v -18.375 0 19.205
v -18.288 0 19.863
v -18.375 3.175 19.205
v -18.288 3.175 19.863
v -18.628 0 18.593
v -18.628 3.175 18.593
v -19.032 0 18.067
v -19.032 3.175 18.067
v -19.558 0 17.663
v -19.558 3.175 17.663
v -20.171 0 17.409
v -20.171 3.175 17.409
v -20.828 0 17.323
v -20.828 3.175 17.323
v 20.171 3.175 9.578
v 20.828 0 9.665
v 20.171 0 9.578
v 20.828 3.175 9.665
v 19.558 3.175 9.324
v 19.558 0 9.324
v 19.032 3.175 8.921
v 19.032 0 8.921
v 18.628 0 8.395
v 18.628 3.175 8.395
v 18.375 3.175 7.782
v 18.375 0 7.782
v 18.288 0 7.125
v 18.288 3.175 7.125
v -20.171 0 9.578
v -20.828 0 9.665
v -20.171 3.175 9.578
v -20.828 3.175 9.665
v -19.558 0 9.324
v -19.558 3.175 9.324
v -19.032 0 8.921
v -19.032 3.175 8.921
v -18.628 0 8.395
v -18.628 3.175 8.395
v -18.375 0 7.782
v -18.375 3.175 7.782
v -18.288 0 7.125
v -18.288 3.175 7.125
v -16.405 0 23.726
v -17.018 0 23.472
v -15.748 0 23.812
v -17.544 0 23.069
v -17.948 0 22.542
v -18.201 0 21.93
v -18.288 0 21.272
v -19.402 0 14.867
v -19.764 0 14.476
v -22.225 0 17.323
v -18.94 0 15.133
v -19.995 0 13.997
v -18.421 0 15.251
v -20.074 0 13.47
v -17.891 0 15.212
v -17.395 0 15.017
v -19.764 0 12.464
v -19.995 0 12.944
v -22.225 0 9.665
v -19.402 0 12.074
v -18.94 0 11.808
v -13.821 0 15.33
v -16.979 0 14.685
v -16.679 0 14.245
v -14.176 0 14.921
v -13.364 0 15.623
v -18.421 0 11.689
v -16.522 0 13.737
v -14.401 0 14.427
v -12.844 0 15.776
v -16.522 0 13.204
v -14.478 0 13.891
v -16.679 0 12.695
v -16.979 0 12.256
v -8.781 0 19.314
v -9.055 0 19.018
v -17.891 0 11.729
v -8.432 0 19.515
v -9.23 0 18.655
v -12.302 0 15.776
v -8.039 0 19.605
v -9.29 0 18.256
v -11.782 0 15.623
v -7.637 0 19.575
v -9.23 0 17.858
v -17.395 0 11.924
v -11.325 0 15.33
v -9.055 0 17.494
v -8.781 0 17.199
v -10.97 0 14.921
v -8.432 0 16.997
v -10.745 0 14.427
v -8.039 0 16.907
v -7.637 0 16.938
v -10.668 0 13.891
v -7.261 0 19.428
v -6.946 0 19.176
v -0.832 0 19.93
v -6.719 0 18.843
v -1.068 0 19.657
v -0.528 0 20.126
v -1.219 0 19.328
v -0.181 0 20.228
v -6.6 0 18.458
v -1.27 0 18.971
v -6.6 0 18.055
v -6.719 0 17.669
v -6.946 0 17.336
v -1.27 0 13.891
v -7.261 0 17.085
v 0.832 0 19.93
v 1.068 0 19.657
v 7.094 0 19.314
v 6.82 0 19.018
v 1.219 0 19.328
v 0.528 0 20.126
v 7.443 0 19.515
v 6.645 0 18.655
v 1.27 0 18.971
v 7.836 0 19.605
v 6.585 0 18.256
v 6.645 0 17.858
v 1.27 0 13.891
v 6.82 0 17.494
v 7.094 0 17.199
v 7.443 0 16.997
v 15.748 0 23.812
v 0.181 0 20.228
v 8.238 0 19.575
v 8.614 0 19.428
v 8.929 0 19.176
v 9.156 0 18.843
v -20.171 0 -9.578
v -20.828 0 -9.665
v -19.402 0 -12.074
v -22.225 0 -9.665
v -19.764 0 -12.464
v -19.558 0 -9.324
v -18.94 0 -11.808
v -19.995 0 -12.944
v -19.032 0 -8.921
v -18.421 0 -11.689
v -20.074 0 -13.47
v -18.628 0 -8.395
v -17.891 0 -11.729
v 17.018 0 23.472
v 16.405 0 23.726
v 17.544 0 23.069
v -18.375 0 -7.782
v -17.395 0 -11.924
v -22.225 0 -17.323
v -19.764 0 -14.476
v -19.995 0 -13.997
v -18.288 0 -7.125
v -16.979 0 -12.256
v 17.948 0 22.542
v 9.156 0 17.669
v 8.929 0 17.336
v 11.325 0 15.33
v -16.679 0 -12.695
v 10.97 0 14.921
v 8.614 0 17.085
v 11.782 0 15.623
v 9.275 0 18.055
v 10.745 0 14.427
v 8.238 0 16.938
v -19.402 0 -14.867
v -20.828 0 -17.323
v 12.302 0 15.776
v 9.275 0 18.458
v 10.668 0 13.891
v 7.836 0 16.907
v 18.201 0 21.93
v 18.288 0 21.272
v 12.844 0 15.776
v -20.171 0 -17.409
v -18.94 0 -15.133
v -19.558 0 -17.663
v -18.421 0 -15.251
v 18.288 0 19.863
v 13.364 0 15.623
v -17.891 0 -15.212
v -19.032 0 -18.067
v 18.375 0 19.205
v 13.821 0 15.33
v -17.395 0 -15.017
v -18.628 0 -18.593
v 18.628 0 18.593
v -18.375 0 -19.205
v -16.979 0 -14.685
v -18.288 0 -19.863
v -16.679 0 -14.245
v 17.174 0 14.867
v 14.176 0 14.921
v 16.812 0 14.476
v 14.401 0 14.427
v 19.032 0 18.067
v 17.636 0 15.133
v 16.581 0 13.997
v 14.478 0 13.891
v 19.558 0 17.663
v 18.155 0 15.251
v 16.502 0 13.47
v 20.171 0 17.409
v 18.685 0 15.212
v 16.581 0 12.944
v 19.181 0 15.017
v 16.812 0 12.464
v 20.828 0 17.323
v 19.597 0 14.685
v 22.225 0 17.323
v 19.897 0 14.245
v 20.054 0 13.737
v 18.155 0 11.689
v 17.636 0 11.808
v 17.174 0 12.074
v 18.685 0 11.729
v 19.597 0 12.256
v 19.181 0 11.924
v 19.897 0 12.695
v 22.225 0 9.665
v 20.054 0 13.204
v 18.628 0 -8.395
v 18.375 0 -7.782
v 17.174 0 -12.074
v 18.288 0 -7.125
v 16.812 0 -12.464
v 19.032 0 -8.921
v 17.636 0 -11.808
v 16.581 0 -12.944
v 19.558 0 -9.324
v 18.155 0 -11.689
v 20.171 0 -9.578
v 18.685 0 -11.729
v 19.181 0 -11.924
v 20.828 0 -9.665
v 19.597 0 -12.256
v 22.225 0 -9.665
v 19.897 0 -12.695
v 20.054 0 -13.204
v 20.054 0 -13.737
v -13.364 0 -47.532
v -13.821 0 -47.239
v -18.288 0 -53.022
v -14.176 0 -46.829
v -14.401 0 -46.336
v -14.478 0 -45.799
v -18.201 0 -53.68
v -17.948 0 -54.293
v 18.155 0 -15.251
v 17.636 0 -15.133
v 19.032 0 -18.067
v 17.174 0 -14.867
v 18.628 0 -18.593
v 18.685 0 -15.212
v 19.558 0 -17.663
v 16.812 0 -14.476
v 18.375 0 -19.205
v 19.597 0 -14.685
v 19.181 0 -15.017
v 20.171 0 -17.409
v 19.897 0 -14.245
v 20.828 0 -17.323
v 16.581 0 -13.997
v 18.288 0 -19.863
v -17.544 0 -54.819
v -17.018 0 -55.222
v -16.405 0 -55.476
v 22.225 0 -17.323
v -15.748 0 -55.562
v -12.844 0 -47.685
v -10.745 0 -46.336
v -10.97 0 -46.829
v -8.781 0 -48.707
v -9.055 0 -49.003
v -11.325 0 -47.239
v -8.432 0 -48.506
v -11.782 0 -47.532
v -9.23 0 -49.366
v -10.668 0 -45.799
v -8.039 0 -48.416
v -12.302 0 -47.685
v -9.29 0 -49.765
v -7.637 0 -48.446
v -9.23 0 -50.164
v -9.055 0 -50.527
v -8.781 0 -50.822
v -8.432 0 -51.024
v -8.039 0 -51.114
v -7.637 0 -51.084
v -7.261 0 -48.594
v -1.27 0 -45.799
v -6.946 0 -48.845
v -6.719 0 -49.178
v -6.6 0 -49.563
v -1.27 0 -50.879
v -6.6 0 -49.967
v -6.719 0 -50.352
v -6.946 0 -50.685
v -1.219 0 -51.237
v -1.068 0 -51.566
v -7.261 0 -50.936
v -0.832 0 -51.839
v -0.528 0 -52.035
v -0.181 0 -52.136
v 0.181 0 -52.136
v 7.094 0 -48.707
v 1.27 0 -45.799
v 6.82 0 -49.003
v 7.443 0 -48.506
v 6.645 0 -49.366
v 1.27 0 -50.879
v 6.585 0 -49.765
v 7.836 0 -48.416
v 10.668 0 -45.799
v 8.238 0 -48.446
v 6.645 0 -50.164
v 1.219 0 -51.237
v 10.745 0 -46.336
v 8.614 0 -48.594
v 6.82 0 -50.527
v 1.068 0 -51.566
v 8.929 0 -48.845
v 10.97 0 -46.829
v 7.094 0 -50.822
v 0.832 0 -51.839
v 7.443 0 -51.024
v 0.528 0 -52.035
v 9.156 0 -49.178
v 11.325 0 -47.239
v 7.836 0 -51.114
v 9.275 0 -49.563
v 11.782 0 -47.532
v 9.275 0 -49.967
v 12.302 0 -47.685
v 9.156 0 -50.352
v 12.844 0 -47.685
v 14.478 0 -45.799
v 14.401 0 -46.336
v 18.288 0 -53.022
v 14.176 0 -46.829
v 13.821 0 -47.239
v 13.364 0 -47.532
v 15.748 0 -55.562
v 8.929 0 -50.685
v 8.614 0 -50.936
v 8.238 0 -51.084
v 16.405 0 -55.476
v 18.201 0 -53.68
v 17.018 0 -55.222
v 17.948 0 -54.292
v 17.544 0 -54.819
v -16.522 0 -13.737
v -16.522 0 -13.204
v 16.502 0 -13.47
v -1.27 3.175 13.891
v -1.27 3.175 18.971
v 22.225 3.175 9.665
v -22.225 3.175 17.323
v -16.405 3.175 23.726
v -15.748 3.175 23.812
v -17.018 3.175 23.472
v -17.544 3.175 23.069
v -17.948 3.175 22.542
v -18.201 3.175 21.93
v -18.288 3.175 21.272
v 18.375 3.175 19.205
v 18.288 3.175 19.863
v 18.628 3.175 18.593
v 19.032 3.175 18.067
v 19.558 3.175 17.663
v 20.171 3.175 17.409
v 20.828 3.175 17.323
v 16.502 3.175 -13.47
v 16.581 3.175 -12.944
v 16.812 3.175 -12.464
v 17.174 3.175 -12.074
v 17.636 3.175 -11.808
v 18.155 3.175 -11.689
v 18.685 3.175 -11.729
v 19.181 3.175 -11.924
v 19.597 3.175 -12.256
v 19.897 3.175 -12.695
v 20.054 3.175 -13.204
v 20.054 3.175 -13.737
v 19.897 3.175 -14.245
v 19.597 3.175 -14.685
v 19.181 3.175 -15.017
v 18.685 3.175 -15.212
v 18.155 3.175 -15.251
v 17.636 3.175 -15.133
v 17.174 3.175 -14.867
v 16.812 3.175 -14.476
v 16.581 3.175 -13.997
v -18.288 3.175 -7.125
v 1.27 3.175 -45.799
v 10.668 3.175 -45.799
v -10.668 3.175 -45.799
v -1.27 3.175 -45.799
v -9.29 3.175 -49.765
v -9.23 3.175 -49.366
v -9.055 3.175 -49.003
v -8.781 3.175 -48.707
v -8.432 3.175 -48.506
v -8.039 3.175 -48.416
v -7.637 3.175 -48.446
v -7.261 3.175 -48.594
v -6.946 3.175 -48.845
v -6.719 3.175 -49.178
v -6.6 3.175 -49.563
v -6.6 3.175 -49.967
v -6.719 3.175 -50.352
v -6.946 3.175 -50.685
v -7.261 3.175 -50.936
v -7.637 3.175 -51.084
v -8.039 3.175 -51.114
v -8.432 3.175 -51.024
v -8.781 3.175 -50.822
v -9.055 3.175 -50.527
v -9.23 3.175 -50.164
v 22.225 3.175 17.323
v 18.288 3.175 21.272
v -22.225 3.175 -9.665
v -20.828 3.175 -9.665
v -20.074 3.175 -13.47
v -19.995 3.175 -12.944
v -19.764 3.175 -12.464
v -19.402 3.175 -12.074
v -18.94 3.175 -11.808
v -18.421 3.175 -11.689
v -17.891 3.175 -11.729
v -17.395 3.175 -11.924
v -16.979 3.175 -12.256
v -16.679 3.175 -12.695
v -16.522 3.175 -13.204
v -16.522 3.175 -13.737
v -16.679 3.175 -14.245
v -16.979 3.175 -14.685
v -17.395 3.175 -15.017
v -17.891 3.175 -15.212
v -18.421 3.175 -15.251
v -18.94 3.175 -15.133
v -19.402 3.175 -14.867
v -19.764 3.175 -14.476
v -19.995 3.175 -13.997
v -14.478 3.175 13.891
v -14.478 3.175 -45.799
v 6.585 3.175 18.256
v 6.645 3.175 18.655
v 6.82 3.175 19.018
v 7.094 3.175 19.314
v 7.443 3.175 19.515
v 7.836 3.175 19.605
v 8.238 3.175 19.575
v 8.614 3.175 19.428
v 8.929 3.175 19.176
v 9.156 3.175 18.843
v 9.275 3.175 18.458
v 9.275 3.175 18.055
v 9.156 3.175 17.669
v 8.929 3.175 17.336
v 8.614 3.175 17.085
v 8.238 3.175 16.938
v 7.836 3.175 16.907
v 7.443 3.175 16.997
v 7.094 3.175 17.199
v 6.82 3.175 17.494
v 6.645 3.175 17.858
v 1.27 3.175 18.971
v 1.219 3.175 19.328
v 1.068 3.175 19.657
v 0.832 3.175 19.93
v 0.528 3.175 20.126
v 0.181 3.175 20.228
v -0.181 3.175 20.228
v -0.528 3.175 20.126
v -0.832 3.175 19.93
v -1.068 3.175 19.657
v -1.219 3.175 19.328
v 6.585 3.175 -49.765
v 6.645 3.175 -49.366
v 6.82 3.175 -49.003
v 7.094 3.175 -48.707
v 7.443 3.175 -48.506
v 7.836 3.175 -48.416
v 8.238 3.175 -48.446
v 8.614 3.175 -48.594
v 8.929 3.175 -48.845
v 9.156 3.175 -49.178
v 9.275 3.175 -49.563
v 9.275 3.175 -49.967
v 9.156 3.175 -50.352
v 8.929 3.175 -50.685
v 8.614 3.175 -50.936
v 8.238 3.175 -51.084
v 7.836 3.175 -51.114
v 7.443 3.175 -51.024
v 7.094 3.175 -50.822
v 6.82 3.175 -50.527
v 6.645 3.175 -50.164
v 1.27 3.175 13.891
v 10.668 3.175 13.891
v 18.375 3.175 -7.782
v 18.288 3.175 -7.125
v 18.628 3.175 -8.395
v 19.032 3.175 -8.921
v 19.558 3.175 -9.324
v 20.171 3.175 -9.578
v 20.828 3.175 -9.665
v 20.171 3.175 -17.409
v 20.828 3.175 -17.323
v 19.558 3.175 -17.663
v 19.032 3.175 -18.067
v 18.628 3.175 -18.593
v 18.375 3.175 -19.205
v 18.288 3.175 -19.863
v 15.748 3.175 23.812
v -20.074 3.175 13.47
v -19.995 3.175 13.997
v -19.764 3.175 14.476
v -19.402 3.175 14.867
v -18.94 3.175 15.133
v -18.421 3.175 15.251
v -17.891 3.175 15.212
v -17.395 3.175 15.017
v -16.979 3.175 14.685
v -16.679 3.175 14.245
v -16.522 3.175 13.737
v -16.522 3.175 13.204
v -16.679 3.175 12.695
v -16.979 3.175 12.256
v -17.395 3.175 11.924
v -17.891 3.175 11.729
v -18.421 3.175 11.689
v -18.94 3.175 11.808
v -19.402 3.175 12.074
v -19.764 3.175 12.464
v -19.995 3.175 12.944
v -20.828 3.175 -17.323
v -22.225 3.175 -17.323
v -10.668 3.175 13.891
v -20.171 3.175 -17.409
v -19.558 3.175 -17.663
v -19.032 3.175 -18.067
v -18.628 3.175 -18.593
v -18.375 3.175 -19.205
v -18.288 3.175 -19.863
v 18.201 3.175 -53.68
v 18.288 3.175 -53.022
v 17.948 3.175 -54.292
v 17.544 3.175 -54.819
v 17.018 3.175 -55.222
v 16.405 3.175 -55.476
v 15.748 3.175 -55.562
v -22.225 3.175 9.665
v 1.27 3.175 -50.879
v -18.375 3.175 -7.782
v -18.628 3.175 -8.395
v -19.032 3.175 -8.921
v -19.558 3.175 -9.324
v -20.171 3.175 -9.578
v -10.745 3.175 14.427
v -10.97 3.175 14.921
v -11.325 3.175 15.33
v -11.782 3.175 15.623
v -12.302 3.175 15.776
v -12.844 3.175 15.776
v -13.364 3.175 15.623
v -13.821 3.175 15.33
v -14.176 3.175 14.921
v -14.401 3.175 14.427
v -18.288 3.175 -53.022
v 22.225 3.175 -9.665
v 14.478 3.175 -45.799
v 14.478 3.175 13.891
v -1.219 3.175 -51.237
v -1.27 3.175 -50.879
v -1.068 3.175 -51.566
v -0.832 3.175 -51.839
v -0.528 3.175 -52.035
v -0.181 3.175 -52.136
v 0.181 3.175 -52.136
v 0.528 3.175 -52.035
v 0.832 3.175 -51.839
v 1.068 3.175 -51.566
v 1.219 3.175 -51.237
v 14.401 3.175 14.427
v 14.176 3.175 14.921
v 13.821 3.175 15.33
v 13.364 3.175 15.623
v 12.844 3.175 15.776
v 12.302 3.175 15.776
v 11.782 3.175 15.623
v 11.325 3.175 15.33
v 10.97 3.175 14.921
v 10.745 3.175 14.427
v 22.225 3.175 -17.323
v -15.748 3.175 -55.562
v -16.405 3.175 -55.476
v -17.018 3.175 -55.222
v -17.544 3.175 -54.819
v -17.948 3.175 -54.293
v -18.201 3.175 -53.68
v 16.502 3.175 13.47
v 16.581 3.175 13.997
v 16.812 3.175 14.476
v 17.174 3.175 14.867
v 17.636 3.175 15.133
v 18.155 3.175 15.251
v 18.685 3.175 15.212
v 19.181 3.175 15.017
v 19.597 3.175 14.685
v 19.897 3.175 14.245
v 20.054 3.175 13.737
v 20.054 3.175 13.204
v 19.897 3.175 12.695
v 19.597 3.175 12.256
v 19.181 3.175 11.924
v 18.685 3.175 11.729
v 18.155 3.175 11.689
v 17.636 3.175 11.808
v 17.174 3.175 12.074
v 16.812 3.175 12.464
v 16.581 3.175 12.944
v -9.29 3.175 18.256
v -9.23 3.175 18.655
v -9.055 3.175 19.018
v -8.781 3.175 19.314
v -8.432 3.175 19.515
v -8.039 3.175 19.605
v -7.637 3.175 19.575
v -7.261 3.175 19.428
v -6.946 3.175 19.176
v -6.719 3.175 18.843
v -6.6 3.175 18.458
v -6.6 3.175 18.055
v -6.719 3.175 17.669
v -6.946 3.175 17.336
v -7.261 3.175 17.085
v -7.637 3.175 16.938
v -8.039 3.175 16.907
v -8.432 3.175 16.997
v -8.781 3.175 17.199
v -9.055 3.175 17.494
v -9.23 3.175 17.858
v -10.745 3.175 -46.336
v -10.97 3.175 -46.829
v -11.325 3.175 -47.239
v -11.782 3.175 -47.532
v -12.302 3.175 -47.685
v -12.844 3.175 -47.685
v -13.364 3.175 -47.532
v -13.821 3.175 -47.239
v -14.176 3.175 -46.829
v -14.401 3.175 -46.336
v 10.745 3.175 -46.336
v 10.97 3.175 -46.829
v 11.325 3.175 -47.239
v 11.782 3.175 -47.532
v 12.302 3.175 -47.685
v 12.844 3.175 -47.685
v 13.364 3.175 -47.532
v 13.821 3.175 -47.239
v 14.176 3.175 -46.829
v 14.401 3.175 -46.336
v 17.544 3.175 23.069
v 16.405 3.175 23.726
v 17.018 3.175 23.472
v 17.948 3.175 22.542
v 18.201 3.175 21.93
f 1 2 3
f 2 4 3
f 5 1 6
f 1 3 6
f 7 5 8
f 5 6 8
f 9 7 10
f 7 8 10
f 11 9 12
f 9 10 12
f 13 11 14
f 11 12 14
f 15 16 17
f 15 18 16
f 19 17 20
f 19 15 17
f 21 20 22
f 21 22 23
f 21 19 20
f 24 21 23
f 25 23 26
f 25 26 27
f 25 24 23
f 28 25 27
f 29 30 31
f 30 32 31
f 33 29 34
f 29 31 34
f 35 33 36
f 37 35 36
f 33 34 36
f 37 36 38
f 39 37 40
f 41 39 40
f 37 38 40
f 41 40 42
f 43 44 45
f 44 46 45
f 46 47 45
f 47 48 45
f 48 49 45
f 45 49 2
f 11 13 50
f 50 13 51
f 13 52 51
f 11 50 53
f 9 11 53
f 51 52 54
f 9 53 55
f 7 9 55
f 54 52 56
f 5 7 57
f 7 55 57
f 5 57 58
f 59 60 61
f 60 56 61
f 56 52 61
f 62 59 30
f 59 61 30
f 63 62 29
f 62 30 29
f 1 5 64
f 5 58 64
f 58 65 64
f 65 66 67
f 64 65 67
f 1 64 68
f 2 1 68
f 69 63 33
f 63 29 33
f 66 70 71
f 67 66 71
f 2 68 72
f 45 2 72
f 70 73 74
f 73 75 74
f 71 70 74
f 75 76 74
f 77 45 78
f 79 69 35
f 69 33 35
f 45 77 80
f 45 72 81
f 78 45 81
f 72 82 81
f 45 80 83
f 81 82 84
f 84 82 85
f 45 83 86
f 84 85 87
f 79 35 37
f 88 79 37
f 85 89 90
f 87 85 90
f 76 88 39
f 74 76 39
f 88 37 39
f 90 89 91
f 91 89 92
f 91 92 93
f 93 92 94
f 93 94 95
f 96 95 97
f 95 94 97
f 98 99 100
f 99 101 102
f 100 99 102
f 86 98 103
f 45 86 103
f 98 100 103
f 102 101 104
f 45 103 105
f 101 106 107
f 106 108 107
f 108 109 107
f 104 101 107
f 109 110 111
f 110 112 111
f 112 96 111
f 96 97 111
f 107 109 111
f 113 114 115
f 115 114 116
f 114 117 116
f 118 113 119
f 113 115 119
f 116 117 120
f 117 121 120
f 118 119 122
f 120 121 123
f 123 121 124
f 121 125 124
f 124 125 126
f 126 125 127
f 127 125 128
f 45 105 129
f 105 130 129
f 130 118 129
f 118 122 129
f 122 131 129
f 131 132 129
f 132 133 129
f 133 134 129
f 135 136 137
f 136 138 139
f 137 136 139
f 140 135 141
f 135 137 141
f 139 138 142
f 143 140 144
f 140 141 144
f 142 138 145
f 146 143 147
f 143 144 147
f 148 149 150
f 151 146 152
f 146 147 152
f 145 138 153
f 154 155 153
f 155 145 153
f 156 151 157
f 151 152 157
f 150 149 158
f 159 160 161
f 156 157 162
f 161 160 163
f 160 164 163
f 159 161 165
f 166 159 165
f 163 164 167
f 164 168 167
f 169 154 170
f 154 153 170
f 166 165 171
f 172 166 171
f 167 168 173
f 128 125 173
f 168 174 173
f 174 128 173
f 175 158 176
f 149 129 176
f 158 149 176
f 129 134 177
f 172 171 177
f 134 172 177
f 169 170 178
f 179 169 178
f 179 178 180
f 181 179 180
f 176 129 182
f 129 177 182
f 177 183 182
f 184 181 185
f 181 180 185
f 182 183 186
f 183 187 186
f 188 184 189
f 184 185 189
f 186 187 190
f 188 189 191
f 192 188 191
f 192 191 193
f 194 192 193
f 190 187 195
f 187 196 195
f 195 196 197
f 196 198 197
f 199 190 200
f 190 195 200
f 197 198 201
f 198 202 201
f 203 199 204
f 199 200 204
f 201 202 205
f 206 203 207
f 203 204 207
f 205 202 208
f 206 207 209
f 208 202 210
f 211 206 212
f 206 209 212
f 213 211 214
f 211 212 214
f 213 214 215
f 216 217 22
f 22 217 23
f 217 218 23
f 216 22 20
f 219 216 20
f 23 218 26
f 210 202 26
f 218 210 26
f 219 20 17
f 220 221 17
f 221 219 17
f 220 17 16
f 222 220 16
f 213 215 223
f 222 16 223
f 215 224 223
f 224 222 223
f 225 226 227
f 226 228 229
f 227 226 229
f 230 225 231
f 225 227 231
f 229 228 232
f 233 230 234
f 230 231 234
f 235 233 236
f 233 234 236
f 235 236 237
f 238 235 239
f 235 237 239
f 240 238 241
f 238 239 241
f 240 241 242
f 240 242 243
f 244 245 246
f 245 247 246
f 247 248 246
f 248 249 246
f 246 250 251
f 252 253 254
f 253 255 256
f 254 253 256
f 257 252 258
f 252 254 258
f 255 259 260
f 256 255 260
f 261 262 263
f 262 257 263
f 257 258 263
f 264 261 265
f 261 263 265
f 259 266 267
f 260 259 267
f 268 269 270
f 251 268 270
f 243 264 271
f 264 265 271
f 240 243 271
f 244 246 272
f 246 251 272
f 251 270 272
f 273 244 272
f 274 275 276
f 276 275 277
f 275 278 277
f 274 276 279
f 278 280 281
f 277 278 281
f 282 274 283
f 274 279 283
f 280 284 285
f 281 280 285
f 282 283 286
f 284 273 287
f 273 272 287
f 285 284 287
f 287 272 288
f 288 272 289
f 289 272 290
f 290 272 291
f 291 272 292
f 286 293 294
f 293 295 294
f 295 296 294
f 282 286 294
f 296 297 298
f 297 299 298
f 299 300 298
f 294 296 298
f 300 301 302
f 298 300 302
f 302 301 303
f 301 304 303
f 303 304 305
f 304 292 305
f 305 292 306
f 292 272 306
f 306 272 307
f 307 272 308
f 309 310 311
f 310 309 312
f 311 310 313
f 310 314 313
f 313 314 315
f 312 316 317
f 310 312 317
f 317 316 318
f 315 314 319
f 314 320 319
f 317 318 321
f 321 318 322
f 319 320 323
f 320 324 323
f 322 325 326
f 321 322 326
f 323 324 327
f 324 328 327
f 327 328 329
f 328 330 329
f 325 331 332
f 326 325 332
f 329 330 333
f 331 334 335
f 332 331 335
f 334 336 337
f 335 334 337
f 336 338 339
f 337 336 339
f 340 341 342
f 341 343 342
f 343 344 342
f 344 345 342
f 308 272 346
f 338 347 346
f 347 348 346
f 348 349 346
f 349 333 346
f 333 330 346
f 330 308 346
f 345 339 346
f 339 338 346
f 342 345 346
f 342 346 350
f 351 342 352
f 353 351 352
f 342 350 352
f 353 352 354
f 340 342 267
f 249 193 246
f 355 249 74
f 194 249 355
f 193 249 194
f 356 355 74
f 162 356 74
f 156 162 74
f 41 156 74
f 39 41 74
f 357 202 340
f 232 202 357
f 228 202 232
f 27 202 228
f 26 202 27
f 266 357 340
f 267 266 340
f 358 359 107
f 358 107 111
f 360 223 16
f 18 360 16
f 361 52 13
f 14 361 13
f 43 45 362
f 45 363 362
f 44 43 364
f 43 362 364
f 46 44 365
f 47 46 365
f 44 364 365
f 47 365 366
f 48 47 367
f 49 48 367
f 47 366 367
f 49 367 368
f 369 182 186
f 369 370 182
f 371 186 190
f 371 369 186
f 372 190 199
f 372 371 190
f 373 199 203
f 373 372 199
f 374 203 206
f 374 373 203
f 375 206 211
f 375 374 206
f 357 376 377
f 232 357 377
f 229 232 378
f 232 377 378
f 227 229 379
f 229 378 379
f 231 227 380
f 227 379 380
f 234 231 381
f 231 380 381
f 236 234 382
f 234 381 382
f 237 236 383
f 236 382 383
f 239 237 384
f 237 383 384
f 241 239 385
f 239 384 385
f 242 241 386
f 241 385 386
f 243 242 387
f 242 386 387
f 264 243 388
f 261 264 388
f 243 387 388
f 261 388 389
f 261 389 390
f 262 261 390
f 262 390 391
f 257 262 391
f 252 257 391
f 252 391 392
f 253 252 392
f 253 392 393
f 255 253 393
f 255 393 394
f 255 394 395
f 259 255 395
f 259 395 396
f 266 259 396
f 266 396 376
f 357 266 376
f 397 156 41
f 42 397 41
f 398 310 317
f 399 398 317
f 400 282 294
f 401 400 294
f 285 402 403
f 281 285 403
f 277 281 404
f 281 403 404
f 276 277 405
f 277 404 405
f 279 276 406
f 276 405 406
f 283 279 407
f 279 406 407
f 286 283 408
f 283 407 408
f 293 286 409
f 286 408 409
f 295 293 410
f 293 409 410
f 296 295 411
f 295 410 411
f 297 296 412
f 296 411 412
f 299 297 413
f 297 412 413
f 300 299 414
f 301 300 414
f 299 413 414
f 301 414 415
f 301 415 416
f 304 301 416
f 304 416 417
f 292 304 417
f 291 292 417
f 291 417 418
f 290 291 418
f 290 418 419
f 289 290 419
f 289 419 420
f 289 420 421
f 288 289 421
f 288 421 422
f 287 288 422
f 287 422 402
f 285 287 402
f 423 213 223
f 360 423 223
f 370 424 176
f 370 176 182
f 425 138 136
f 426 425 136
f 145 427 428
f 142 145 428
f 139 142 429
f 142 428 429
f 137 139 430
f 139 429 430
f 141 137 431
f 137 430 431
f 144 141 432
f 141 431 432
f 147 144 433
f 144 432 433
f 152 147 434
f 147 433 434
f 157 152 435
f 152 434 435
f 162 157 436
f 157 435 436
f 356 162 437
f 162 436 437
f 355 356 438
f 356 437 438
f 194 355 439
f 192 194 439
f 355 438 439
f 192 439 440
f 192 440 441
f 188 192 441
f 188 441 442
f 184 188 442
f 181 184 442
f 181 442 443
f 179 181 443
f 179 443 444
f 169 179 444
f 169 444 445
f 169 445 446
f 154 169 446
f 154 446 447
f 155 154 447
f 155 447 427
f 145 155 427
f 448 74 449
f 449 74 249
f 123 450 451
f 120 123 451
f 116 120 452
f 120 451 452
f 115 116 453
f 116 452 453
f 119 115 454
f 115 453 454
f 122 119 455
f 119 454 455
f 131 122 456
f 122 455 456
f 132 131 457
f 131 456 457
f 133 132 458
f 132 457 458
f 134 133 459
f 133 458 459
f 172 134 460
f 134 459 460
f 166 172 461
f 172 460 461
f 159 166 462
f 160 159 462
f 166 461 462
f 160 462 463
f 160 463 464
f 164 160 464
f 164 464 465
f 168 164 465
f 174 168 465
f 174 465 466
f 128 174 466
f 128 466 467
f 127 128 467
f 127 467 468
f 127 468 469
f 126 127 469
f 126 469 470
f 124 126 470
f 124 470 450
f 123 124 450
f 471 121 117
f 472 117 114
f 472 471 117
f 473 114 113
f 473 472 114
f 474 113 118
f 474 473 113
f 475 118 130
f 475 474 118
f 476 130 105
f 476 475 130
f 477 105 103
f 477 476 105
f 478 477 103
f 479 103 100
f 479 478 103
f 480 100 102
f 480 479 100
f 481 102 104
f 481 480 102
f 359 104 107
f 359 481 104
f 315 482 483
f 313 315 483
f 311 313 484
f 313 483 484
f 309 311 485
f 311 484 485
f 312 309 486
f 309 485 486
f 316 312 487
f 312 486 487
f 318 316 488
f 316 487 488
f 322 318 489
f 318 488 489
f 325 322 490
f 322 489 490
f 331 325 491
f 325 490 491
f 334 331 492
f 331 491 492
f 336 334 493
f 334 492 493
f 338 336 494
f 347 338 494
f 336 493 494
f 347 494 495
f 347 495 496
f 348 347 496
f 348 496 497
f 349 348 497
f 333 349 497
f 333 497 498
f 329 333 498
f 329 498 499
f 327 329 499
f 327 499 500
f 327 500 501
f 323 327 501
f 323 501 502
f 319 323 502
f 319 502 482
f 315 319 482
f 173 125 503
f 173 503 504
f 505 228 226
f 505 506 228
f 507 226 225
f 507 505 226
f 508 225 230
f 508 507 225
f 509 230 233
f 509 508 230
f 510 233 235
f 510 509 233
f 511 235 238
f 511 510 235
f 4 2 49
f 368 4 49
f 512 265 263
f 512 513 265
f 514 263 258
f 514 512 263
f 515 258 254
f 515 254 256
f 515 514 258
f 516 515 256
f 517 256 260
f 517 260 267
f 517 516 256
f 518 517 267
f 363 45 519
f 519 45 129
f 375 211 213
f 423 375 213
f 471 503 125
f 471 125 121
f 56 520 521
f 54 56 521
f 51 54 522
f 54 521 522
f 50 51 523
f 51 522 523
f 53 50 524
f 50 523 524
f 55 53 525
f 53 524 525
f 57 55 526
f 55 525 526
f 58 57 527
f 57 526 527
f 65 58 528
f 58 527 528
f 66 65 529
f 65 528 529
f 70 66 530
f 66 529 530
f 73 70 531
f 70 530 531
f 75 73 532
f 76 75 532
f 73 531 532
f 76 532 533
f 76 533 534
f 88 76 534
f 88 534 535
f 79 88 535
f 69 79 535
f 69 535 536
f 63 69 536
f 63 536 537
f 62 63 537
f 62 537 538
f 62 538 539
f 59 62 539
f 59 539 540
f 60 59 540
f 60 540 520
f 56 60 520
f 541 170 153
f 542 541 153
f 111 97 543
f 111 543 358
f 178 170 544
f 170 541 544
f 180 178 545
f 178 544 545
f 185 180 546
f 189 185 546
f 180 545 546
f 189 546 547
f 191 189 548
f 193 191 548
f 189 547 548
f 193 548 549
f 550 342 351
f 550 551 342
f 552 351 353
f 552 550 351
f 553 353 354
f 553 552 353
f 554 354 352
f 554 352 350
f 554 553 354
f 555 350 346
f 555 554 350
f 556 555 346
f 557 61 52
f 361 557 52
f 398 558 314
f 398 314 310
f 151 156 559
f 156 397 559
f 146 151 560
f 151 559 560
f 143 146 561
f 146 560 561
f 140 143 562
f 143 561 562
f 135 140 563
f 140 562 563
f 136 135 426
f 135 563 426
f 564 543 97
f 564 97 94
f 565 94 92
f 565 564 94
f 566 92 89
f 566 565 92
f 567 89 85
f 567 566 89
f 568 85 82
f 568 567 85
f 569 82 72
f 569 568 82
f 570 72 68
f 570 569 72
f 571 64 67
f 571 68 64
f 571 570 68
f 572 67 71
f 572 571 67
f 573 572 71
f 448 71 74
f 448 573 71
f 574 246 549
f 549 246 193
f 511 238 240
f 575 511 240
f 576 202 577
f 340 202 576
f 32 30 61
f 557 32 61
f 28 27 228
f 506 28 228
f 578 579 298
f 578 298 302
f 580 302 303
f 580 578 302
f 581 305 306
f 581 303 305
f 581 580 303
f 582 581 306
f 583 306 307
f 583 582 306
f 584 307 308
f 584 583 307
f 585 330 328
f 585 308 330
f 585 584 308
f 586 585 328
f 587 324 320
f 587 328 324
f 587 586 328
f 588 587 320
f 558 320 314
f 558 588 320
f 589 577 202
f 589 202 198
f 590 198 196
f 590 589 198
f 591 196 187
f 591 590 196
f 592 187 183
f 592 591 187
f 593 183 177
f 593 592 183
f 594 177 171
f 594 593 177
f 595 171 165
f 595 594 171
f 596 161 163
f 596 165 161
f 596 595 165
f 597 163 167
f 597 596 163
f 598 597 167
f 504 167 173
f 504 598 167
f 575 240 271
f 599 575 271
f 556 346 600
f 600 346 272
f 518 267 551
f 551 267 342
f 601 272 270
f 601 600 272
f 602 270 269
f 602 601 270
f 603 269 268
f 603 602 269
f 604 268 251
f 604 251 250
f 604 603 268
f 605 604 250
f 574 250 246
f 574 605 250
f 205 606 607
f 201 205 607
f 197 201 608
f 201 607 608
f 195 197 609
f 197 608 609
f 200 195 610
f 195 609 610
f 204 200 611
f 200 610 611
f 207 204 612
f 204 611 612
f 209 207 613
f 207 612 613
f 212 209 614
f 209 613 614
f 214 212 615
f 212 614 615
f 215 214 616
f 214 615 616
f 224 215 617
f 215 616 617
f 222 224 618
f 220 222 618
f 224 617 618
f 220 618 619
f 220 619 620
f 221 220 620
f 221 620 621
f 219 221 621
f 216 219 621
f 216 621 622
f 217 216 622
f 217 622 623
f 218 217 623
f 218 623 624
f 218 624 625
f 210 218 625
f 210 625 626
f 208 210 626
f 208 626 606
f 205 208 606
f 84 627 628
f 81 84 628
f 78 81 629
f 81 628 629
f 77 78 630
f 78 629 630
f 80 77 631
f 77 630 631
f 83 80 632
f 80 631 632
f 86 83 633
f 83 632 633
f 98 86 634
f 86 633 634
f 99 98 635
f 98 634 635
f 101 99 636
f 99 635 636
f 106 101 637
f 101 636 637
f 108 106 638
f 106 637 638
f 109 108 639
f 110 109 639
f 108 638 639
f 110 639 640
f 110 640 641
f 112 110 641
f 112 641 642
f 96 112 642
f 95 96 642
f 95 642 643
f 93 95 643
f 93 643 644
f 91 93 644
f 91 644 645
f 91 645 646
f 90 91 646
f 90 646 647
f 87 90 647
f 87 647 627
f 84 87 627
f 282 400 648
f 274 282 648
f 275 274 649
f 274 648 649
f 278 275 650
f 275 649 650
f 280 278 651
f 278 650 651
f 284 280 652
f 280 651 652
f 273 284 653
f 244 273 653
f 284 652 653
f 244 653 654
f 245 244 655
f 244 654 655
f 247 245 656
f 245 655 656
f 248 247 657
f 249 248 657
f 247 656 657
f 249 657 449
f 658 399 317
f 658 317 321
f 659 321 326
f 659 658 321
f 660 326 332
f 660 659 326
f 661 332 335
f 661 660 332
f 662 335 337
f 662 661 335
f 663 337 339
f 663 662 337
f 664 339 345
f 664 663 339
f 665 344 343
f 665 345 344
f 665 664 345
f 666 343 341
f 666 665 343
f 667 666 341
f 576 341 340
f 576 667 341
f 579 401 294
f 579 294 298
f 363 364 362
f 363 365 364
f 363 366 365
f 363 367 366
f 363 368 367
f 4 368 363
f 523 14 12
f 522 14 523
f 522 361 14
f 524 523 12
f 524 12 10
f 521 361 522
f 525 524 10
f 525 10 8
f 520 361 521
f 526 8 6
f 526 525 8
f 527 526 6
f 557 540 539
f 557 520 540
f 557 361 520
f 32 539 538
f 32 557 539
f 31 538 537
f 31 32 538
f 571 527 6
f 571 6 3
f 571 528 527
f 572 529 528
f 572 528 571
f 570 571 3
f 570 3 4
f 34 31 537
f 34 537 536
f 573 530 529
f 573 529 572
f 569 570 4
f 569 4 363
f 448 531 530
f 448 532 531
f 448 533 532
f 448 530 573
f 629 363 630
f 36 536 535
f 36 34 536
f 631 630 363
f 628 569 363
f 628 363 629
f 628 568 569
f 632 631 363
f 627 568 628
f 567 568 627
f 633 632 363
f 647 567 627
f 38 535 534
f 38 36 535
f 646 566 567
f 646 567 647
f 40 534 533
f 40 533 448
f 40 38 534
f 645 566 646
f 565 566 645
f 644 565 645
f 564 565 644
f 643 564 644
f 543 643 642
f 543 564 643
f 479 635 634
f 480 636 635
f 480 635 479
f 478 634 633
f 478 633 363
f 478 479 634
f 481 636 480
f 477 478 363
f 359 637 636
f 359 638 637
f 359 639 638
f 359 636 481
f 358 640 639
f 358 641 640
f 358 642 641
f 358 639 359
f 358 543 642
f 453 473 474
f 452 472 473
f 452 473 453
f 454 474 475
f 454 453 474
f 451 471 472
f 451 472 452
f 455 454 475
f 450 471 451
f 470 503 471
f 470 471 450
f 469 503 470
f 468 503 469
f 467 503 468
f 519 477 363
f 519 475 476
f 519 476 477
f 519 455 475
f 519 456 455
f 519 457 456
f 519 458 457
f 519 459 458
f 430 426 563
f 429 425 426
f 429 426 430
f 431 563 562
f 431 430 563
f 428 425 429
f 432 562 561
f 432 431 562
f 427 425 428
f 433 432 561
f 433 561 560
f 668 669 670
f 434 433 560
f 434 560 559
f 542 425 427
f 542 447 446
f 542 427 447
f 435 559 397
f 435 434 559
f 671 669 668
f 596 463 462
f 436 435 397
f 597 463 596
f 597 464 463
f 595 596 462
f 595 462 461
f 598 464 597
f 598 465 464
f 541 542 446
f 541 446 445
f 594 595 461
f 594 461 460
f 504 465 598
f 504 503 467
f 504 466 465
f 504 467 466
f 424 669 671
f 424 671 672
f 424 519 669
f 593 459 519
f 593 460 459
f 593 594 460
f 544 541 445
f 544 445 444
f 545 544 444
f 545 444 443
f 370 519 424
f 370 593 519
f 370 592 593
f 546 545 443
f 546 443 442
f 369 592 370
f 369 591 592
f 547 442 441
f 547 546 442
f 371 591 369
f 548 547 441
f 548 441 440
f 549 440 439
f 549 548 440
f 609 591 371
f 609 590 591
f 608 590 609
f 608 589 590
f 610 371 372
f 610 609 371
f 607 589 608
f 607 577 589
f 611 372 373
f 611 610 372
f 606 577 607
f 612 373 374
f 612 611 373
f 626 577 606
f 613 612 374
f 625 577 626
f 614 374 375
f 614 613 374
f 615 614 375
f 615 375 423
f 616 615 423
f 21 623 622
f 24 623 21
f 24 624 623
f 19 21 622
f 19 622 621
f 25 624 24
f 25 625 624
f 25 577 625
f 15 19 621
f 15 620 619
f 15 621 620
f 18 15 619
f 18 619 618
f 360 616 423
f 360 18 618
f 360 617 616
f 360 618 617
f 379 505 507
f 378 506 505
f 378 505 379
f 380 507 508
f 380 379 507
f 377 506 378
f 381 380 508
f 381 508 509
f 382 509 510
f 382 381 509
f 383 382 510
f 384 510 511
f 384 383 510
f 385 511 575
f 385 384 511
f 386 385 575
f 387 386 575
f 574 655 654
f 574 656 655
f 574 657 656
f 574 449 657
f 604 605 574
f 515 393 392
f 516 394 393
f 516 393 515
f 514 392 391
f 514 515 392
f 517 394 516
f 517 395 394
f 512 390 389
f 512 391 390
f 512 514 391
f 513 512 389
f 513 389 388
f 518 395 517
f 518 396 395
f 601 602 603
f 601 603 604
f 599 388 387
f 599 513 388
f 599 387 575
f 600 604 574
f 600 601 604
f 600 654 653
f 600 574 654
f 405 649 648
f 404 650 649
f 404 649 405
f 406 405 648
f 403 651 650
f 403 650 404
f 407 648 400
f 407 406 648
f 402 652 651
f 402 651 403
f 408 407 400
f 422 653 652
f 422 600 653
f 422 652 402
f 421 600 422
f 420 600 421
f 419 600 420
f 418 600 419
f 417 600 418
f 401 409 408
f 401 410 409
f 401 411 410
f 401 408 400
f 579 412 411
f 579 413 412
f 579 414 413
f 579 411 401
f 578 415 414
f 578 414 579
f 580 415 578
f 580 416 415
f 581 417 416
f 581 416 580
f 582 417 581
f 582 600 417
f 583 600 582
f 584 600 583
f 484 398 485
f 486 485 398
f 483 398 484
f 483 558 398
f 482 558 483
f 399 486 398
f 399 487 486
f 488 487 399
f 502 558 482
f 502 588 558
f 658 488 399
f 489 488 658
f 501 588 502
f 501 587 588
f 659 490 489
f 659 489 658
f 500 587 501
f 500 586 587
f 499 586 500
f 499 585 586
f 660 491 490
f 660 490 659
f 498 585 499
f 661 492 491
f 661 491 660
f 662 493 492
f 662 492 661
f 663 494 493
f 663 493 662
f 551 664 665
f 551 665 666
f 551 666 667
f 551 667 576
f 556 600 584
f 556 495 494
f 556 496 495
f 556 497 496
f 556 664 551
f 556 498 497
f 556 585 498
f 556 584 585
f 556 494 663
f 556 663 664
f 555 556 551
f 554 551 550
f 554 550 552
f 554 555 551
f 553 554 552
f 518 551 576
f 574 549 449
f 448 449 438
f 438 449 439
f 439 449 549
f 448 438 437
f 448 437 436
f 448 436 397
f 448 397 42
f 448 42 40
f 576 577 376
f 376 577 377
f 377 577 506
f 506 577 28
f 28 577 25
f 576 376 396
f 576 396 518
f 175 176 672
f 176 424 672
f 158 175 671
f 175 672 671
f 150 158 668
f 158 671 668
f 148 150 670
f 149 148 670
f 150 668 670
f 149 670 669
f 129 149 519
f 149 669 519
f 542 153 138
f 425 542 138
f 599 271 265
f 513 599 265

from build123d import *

# Parameters (mm, degrees)
SKETCH1_W                           = 28.956
SKETCH1_H                           = 59.69
BOSS_EXTRUDE1_DEPTH                 = 3.175
F_6_32_TAPPED_HOLE1_D               = 2.7051
F_6_32_TAPPED_HOLE1_DEPTH           = 3.175
F_9_64_0_14063_DIAMETER_HOLE1_D     = 3.572002
F_9_64_0_14063_DIAMETER_HOLE1_DEPTH = 3.175
FILLET1_R                           = 2.54
CUT_EXTRUDE1_REACH                  = 5.175
CUT_EXTRUDE2_REACH                  = 5.175


with BuildPart() as part:
    # Sketch1 → Boss-Extrude1 (new body)
    with BuildSketch(Plane(origin=(0, 0, 0), x_dir=(1, 0, 0), z_dir=(0, 1, 0))):
        Polygon((18.288, -23.8125), (18.288, -17.3228), (22.225, -17.3228), (22.225, -9.6647), (18.288, -9.6647), (18.288, 9.6647), (22.225, 9.6647), (22.225, 17.3228), (18.288, 17.3228), (18.288, 55.5625), (-18.288, 55.5625), (-18.288, 17.3228), (-22.225, 17.3228), (-22.225, 9.6647), (-18.288, 9.6647), (-18.288, -9.6647), (-22.225, -9.6647), (-22.225, -17.3228), (-18.288, -17.3228), (-18.288, -23.8125), align=None)
        with Locations((0, 15.954375)):
            Rectangle(SKETCH1_W, SKETCH1_H, mode=Mode.SUBTRACT)
    extrude(amount=BOSS_EXTRUDE1_DEPTH)

    # #6-32 Tapped Hole1
    with Locations(Plane.XZ):
        with Locations((-7.9375, 18.25625), (7.9375, 18.25625), (7.9375, -49.76495), (-7.9375, -49.76495)):
            Hole(F_6_32_TAPPED_HOLE1_D / 2, depth=F_6_32_TAPPED_HOLE1_DEPTH)

    # 9/64 (0.14063) Diameter Hole1
    with Locations(Plane.XZ):
        with Locations((18.288, -13.470384182), (18.288, 13.470384182), (-18.288, -13.470384182), (-18.288, 13.470384182)):
            Hole(F_9_64_0_14063_DIAMETER_HOLE1_D / 2, depth=F_9_64_0_14063_DIAMETER_HOLE1_DEPTH)

    # Fillet1
    fillet1_edges = [part.edges().sort_by_distance(p)[0] for p in [
        (18.288, 1.5875, 23.8125),
        (-18.288, 1.5875, 23.8125),
        (-18.288, 1.5875, 17.3228),
        (-18.288, 1.5875, 9.6647),
        (-18.288, 1.5875, -9.6647),
        (-18.288, 1.5875, -17.3228),
        (-18.288, 1.5875, -55.5625),
        (18.288, 1.5875, -55.5625),
        (18.288, 1.5875, -17.3228),
        (18.288, 1.5875, -9.6647),
        (18.288, 1.5875, 9.6647),
        (18.288, 1.5875, 17.3228),
    ]]
    fillet(fillet1_edges, radius=FILLET1_R)

    # Sketch7 → Cut-Extrude1 (cut, up to next)
    with BuildSketch(Plane(origin=(0, 3.175, 0), x_dir=(1, 0, 0), z_dir=(0, 1, 0)), mode=Mode.PRIVATE) as cut_extrude1_sk1:
        with BuildLine():
            Line((1.27, -13.890625), (1.27, -18.970625))
            ThreePointArc((1.27, -18.970625), (0, -20.240625), (-1.27, -18.970625))
            Line((-1.27, -18.970625), (-1.27, -13.890625))
            ThreePointArc((-1.27, -13.890625), (0, -12.620625), (1.27, -13.890625))
        make_face()
    cut_extrude1_tool1 = extrude(cut_extrude1_sk1.sketch, amount=-CUT_EXTRUDE1_REACH, mode=Mode.PRIVATE) & part.part
    add(cut_extrude1_tool1.solids().sort_by_distance((0, 3.175, 16.430625))[0], mode=Mode.SUBTRACT)
    # Sketch7 → Cut-Extrude1 (cut, up to next)
    with BuildSketch(Plane(origin=(0, 3.175, 0), x_dir=(1, 0, 0), z_dir=(0, 1, 0)), mode=Mode.PRIVATE) as cut_extrude1_sk2:
        with BuildLine():
            Line((-1.27, 45.799375), (-1.27, 50.879375))
            ThreePointArc((-1.27, 50.879375), (0, 52.149375), (1.27, 50.879375))
            Line((1.27, 50.879375), (1.27, 45.799375))
            ThreePointArc((1.27, 45.799375), (0, 44.529375), (-1.27, 45.799375))
        make_face()
    cut_extrude1_tool2 = extrude(cut_extrude1_sk2.sketch, amount=-CUT_EXTRUDE1_REACH, mode=Mode.PRIVATE) & part.part
    add(cut_extrude1_tool2.solids().sort_by_distance((0, 3.175, -48.339375))[0], mode=Mode.SUBTRACT)

    # Sketch8 → Cut-Extrude2 (cut, up to next)
    with BuildSketch(Plane(origin=(0, 3.175, 0), x_dir=(1, 0, 0), z_dir=(0, 1, 0)), mode=Mode.PRIVATE) as cut_extrude2_sk1:
        with BuildLine():
            Line((14.478, 45.799375), (10.668, 45.799375))
            ThreePointArc((10.668, 45.799375), (12.573, 47.704375), (14.478, 45.799375))
        make_face()
    cut_extrude2_tool1 = extrude(cut_extrude2_sk1.sketch, amount=-CUT_EXTRUDE2_REACH, mode=Mode.PRIVATE) & part.part
    add(cut_extrude2_tool1.solids().sort_by_distance((12.573, 3.175, -46.607882))[0], mode=Mode.SUBTRACT)
    # Sketch8 → Cut-Extrude2 (cut, up to next)
    with BuildSketch(Plane(origin=(0, 3.175, 0), x_dir=(1, 0, 0), z_dir=(0, 1, 0)), mode=Mode.PRIVATE) as cut_extrude2_sk2:
        with BuildLine():
            Line((-14.478, 45.799375), (-10.668, 45.799375))
            ThreePointArc((-10.668, 45.799375), (-12.573, 47.704375), (-14.478, 45.799375))
        make_face()
    cut_extrude2_tool2 = extrude(cut_extrude2_sk2.sketch, amount=-CUT_EXTRUDE2_REACH, mode=Mode.PRIVATE) & part.part
    add(cut_extrude2_tool2.solids().sort_by_distance((-12.573, 3.175, -46.607882))[0], mode=Mode.SUBTRACT)
    # Sketch8 → Cut-Extrude2 (cut, up to next)
    with BuildSketch(Plane(origin=(0, 3.175, 0), x_dir=(1, 0, 0), z_dir=(0, 1, 0)), mode=Mode.PRIVATE) as cut_extrude2_sk3:
        with BuildLine():
            Line((-14.478, -13.890625), (-10.668, -13.890625))
            ThreePointArc((-10.668, -13.890625), (-12.573, -15.795625), (-14.478, -13.890625))
        make_face()
    cut_extrude2_tool3 = extrude(cut_extrude2_sk3.sketch, amount=-CUT_EXTRUDE2_REACH, mode=Mode.PRIVATE) & part.part
    add(cut_extrude2_tool3.solids().sort_by_distance((-12.573, 3.175, 14.699132))[0], mode=Mode.SUBTRACT)
    # Sketch8 → Cut-Extrude2 (cut, up to next)
    with BuildSketch(Plane(origin=(0, 3.175, 0), x_dir=(1, 0, 0), z_dir=(0, 1, 0)), mode=Mode.PRIVATE) as cut_extrude2_sk4:
        with BuildLine():
            Line((10.668, -13.890625), (14.478, -13.890625))
            ThreePointArc((14.478, -13.890625), (12.573, -15.795625), (10.668, -13.890625))
        make_face()
    cut_extrude2_tool4 = extrude(cut_extrude2_sk4.sketch, amount=-CUT_EXTRUDE2_REACH, mode=Mode.PRIVATE) & part.part
    add(cut_extrude2_tool4.solids().sort_by_distance((12.573, 3.175, 14.699132))[0], mode=Mode.SUBTRACT)


solid = part.part
